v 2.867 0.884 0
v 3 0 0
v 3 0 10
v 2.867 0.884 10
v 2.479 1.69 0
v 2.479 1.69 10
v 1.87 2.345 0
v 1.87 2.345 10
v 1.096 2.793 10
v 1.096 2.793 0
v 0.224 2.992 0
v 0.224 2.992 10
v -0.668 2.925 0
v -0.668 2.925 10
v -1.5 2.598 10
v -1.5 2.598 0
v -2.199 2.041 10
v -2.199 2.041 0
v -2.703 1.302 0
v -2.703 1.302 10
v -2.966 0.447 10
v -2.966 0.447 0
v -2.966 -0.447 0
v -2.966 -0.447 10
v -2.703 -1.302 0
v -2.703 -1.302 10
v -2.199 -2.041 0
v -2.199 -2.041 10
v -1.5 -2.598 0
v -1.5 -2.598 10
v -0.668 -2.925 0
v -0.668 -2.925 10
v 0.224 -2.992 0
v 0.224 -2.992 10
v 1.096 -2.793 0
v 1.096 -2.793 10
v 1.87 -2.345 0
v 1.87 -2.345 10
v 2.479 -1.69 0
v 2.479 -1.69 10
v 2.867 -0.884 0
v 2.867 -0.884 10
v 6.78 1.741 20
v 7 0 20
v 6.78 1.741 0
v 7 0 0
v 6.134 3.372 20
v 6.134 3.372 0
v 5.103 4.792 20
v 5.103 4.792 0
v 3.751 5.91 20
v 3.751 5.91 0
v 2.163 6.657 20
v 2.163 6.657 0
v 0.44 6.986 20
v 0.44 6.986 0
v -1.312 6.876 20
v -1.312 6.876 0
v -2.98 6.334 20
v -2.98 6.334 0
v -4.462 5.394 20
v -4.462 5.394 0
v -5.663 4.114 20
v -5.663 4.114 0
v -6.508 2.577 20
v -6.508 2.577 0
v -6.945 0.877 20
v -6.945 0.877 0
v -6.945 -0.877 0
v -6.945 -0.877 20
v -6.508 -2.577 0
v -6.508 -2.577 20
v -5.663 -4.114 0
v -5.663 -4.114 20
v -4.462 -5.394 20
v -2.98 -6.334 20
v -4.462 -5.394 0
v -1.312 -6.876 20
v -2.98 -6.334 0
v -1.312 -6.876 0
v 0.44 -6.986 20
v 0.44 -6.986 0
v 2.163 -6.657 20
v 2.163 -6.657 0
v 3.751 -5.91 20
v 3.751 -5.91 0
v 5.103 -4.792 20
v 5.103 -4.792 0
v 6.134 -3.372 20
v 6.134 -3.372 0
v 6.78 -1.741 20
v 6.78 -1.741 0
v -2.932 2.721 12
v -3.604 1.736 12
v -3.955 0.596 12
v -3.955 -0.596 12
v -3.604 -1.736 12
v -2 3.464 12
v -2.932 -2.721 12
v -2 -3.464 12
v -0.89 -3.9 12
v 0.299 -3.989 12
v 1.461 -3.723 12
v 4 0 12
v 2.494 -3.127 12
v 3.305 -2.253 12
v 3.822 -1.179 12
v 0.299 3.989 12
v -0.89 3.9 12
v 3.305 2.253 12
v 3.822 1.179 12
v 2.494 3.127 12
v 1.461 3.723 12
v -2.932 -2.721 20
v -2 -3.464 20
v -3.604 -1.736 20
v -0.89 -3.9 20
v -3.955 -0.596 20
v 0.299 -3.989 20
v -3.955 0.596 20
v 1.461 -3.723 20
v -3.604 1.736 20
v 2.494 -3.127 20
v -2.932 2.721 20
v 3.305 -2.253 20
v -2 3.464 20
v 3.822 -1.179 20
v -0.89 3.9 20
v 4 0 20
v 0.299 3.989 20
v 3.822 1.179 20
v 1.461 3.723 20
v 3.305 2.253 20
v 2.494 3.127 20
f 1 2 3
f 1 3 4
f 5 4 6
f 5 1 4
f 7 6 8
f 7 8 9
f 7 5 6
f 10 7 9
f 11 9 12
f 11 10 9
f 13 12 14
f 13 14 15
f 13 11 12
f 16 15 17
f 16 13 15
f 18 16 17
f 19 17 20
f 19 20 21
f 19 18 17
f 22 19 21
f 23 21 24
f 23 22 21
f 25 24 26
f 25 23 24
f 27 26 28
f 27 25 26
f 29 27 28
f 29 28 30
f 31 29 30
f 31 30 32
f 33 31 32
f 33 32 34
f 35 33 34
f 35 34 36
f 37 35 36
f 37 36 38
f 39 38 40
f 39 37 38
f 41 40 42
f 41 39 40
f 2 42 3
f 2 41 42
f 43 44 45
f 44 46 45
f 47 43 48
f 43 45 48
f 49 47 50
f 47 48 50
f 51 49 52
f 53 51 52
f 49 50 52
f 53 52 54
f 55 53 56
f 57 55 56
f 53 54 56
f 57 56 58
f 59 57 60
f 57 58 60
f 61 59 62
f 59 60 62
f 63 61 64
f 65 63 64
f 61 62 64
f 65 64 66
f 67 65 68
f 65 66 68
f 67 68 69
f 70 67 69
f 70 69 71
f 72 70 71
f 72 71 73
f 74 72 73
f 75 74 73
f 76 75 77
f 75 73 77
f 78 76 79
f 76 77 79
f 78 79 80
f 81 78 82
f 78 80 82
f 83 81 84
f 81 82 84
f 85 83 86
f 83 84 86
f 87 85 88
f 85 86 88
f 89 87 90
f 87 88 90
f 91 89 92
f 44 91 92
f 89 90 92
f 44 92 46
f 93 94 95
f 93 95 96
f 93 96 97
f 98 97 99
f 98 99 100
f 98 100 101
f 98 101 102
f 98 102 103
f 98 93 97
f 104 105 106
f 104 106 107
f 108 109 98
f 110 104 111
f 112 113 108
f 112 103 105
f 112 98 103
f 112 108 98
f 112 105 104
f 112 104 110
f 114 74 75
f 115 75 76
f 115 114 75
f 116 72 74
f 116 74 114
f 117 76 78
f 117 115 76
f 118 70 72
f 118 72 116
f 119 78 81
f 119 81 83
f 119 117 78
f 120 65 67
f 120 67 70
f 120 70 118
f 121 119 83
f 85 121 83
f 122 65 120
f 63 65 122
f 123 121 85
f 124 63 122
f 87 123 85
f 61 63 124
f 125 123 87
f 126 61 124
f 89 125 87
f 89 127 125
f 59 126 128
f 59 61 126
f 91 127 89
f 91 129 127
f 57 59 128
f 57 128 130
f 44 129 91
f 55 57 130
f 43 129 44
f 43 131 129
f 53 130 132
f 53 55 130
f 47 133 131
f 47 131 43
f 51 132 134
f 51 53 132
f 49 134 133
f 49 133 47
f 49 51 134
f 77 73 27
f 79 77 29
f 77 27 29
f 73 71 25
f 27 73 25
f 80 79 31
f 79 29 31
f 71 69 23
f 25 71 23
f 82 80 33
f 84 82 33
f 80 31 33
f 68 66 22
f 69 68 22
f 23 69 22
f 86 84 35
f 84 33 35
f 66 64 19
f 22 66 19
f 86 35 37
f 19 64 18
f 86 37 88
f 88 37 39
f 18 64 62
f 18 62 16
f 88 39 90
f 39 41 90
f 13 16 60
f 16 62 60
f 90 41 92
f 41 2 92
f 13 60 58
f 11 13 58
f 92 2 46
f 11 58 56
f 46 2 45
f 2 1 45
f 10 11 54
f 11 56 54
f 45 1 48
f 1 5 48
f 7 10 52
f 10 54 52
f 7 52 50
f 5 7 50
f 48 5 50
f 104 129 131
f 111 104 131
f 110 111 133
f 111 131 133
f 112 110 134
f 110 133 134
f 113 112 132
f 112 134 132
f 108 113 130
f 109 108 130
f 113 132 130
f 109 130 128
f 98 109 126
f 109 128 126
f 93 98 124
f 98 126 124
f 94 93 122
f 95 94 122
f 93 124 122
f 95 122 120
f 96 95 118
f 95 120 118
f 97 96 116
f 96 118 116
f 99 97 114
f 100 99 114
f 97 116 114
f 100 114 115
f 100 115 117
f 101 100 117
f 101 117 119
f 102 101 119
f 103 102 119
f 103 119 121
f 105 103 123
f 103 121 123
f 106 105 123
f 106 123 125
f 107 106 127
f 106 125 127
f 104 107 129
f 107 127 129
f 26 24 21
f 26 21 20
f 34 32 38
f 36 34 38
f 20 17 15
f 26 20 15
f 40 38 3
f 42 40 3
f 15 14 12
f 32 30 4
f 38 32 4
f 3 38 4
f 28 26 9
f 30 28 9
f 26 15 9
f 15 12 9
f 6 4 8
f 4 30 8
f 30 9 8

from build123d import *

# Parameters (mm, degrees)
SKETCH_1_R          = 7
SKETCH_1_R_2        = 3
EXTRUDE_1_DEPTH     = 10
SKETCH_2_R          = 7
EXTRUDE_2_DEPTH     = 10
SKETCH_3_R          = 4
CUT_EXTRUDE_1_DEPTH = 8


with BuildPart() as part:
    # 草图1 → 凸台-拉伸1 (new body)
    with BuildSketch(Plane.XY):
        Circle(SKETCH_1_R)
        Circle(SKETCH_1_R_2, mode=Mode.SUBTRACT)
    extrude(amount=EXTRUDE_1_DEPTH)

    # 草图2 → 凸台-拉伸2 (add)
    with BuildSketch(Plane.XY.offset(10)):
        Circle(SKETCH_2_R)
    extrude(amount=EXTRUDE_2_DEPTH)

    # 草图3 → 切除-拉伸1 (cut)
    with BuildSketch(Plane.XY.offset(20)):
        Circle(SKETCH_3_R)
    extrude(amount=-CUT_EXTRUDE_1_DEPTH, mode=Mode.SUBTRACT)


solid = part.part
